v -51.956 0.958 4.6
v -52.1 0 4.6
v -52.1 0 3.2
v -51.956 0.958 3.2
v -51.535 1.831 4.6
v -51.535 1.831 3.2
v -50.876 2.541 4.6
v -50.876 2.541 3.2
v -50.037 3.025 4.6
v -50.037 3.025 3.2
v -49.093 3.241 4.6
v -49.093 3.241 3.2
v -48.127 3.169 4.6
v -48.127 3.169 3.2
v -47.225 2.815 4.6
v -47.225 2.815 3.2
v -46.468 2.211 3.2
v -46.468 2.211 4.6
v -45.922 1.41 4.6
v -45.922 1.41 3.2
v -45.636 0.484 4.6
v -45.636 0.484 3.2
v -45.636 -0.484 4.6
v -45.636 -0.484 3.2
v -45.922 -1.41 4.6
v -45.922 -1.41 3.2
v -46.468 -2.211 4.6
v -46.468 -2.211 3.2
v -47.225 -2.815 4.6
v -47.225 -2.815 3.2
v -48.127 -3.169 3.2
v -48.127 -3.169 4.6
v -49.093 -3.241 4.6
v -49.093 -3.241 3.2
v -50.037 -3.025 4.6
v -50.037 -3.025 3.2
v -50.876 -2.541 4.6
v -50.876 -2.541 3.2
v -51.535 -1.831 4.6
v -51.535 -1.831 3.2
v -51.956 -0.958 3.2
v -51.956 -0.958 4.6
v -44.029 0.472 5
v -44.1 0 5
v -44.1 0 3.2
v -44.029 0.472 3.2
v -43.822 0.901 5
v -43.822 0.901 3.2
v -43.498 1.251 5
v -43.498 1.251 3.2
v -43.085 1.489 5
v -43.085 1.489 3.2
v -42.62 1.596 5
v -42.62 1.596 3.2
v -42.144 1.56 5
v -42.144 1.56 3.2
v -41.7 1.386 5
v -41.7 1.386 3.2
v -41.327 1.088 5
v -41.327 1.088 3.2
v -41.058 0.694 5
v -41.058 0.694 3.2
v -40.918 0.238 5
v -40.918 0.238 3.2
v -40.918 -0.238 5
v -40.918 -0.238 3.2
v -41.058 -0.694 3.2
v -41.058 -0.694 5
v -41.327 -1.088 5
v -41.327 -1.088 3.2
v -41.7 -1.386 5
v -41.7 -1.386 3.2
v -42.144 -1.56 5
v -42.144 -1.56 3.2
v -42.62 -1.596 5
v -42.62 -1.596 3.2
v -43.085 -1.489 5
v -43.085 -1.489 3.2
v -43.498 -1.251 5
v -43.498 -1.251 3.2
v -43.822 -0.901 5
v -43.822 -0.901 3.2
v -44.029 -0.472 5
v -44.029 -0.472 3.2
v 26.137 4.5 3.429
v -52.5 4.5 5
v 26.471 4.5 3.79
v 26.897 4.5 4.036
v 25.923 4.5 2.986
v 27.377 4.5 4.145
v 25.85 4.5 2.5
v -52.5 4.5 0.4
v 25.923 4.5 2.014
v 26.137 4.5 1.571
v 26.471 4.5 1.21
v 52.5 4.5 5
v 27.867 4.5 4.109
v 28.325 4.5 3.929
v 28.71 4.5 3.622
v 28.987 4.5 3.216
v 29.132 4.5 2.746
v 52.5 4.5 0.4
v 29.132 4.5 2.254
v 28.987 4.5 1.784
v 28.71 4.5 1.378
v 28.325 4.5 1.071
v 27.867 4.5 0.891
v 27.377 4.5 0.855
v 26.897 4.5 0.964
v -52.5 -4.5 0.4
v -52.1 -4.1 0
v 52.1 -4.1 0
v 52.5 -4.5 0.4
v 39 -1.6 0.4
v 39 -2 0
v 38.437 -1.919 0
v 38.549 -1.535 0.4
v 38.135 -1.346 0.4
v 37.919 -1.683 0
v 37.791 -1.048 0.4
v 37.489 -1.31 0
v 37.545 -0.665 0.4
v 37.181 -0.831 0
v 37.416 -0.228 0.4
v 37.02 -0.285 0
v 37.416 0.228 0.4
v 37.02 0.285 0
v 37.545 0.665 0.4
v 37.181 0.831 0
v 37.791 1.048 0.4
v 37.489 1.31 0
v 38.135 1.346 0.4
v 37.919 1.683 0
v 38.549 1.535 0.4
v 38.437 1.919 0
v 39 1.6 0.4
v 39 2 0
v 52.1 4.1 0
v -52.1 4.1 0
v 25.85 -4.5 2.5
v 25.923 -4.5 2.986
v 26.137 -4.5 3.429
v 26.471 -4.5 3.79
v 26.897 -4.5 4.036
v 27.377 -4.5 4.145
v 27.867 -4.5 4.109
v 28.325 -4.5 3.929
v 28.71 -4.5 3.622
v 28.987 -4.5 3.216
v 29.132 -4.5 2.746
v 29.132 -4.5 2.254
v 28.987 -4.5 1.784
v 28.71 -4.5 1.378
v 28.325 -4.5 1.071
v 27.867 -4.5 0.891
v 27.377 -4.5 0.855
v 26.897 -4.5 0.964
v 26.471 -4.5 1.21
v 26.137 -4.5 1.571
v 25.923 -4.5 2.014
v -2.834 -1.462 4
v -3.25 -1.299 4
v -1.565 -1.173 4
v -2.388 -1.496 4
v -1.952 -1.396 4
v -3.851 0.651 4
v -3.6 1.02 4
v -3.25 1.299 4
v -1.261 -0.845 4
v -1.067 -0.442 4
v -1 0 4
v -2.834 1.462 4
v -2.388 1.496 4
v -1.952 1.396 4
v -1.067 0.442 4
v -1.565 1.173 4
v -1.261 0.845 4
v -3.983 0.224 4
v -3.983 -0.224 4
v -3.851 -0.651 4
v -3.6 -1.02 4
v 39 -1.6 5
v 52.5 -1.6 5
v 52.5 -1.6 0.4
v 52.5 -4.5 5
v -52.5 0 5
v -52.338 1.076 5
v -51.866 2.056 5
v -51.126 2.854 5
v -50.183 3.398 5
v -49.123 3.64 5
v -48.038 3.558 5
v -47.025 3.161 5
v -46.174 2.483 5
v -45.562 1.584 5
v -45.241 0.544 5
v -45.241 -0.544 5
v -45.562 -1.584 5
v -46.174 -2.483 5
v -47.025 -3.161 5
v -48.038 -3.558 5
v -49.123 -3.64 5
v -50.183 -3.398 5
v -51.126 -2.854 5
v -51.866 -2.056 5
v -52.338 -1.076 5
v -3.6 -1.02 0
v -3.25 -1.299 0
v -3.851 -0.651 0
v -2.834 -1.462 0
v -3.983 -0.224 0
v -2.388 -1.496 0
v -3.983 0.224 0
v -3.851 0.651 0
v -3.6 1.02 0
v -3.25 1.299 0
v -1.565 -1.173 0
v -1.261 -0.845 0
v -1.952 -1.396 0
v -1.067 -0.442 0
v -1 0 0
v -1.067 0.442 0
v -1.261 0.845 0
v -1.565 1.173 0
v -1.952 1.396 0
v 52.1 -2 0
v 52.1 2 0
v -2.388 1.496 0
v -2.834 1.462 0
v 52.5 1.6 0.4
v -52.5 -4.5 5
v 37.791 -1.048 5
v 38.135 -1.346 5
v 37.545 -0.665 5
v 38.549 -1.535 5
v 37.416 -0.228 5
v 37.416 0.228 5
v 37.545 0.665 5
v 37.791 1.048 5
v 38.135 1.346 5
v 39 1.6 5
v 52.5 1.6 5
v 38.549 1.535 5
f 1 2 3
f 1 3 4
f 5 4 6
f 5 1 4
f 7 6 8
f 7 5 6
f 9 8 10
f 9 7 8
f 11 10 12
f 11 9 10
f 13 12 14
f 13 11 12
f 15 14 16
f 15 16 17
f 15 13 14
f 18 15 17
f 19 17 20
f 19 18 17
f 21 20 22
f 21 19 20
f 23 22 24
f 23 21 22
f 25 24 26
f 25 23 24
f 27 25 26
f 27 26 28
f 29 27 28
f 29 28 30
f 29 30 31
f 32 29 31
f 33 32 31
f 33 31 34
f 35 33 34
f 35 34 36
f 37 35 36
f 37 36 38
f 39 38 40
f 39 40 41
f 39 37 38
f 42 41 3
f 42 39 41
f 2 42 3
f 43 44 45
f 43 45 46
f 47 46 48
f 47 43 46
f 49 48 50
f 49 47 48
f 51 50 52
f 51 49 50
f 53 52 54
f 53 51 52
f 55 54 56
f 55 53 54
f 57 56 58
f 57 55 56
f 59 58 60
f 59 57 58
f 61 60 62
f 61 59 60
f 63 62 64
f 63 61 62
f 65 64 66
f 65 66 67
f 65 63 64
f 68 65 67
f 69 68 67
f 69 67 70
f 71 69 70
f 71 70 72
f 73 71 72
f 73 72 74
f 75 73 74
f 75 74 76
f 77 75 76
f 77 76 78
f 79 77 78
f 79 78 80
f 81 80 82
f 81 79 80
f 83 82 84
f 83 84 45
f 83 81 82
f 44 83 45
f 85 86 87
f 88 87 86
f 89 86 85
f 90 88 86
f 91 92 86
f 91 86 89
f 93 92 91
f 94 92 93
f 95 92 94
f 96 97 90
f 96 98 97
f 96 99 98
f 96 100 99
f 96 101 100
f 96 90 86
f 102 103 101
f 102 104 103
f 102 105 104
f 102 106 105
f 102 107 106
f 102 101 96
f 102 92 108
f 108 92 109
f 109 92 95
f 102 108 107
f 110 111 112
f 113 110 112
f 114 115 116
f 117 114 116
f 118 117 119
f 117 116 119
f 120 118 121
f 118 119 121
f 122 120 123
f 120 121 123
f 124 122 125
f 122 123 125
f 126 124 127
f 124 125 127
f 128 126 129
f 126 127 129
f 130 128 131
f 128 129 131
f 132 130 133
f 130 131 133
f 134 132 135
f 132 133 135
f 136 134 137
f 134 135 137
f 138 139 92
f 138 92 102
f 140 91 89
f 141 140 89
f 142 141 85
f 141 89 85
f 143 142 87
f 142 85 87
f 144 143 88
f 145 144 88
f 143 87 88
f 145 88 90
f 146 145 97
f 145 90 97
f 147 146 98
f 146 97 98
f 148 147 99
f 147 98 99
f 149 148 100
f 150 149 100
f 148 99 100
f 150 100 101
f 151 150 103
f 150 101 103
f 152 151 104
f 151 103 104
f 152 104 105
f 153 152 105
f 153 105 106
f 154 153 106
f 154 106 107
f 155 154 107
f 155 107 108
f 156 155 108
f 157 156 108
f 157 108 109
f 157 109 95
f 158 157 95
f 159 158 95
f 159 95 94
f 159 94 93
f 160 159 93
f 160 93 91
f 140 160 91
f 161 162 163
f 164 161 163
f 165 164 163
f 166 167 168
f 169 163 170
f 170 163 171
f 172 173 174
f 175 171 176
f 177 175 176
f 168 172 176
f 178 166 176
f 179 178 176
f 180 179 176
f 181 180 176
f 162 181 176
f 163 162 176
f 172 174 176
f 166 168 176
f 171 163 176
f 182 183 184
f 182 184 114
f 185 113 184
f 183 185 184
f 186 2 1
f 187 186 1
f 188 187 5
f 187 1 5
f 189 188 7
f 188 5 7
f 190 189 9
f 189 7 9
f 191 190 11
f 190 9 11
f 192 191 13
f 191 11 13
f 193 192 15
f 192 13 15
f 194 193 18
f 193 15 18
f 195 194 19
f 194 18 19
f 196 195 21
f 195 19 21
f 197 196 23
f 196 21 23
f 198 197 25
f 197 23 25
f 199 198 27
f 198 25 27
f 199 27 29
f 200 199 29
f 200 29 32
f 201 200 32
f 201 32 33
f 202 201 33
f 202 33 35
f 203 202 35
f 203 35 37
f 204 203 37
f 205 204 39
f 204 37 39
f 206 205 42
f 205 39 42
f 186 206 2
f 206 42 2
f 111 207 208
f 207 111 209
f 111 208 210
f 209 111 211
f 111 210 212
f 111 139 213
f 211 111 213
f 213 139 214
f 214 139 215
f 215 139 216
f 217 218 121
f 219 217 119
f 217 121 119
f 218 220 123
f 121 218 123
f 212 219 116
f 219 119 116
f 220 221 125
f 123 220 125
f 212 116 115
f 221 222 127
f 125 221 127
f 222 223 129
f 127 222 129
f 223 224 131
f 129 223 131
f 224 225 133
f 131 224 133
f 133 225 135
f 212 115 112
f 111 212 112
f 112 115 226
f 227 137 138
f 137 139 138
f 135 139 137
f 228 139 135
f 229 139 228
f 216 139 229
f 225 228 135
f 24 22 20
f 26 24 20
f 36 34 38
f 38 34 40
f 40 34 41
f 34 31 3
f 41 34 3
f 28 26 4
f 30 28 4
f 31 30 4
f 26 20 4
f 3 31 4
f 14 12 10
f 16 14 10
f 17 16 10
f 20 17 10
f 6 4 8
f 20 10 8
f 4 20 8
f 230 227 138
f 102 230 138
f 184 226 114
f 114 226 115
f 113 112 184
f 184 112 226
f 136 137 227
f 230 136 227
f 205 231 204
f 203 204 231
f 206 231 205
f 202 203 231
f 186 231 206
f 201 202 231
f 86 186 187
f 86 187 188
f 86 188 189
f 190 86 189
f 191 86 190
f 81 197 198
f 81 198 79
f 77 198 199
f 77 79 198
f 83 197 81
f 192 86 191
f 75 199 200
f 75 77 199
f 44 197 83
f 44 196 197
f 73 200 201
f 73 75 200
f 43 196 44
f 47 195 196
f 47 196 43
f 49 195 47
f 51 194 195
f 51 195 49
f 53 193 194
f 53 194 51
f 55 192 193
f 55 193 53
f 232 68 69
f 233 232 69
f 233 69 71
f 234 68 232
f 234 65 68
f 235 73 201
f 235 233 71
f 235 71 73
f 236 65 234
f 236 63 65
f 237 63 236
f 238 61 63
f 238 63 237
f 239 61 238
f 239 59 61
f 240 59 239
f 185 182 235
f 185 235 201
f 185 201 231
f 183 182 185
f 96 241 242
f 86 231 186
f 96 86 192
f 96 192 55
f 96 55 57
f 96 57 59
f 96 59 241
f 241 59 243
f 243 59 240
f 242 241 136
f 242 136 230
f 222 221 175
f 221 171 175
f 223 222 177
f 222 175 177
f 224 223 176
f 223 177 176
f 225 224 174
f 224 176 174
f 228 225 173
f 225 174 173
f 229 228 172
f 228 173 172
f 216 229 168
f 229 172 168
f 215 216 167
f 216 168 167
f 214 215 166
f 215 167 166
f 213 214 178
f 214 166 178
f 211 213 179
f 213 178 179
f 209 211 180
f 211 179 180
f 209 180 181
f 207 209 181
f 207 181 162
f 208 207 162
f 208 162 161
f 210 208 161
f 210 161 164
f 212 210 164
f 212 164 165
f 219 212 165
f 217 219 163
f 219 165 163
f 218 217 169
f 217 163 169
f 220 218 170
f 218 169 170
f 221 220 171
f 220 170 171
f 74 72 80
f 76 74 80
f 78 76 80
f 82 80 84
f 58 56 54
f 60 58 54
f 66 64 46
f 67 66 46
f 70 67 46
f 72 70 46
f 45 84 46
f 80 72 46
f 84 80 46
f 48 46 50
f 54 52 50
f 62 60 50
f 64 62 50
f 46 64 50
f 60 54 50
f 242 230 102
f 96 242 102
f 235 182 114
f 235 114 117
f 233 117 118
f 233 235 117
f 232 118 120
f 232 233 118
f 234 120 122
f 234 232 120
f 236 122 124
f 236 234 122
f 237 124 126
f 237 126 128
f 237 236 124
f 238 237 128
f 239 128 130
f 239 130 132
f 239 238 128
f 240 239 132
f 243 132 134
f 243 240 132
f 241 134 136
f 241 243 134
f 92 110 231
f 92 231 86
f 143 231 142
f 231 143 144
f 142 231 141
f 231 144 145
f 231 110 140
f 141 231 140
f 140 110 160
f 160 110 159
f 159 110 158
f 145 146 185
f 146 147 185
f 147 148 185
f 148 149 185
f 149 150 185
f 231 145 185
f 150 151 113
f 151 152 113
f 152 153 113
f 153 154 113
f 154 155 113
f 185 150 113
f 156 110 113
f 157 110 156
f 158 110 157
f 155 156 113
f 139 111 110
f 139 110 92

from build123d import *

# Parameters (mm, degrees)
SKETCH1_W           = 105
SKETCH1_H           = 9
BOSS_EXTRUDE1_DEPTH = 5
CUT_EXTRUDE1_DEPTH  = 5
SKETCH8_W           = 8
SKETCH8_H           = 3.2
CUT_EXTRUDE4_DEPTH  = 10
SKETCH7_R           = 3.25
SKETCH7_R_2         = 1.6
CUT_EXTRUDE2_DEPTH  = 1.8
CHAMFER1_SIZE       = 0.4
CHAMFER2_SIZE       = 0.4
SKETCH2_R           = 1.65
CUT_EXTRUDE3_DEPTH  = 10
SKETCH10_R          = 1.5
CUT_EXTRUDE5_DEPTH  = 4


with BuildPart() as part:
    # Sketch1 → Boss-Extrude1 (new body)
    with BuildSketch(Plane.XY):
        Rectangle(SKETCH1_W, SKETCH1_H)
    extrude(amount=BOSS_EXTRUDE1_DEPTH)

    # Sketch4 → Cut-Extrude1 (cut)
    with BuildSketch(Plane.XY.offset(5)):
        with BuildLine():
            Line((39, 1.6), (45, 1.6))
            ThreePointArc((45, 1.6), (46.6, 0), (45, -1.6))
            Line((45, -1.6), (39, -1.6))
            ThreePointArc((39, -1.6), (37.4, 0), (39, 1.6))
        make_face()
    extrude(amount=-CUT_EXTRUDE1_DEPTH, mode=Mode.SUBTRACT)

    # Sketch8 → Cut-Extrude4 (cut)
    with BuildSketch(Plane.XY.offset(5)):
        with Locations((48.5, 0)):
            Rectangle(SKETCH8_W, SKETCH8_H)
    extrude(amount=-CUT_EXTRUDE4_DEPTH, mode=Mode.SUBTRACT)

    # Sketch7 → Cut-Extrude2 (cut)
    with BuildSketch(Plane(origin=(0, 0, 5), x_dir=(-1, 0, 0), z_dir=(0, 0, -1))):
        with Locations((48.85, 0)):
            Circle(SKETCH7_R)
        with Locations((42.5, 0)):
            Circle(SKETCH7_R_2)
    extrude(amount=CUT_EXTRUDE2_DEPTH, mode=Mode.SUBTRACT)

    # Chamfer1
    chamfer1_edges = [part.edges().sort_by_distance(p)[0] for p in [
        (-45.6, 0, 5),
    ]]
    chamfer(chamfer1_edges, length=CHAMFER1_SIZE - 0.0001)  # a hair under: the kernel refuses the full size

    # Chamfer2
    chamfer2_edges = [part.edges().sort_by_distance(p)[0] for p in [
        (37.4, 0, 0),
        (45.75, 1.6, 0),
        (45.75, -1.6, 0),
        (52.5, 3.05, 0),
        (0, 4.5, 0),
        (52.5, -3.05, 0),
        (0, -4.5, 0),
        (-52.5, 0, 0),
    ]]
    chamfer(chamfer2_edges, length=CHAMFER2_SIZE)

    # Sketch2 → Cut-Extrude3 (cut)
    with BuildSketch(Plane(origin=(0, 4.5, 0), x_dir=(1, 0, 0), z_dir=(0, 1, 0))):
        with Locations(Location((27.5, -2.5, 0), (0, 0, 180))):
            Circle(SKETCH2_R)
    extrude(amount=-CUT_EXTRUDE3_DEPTH, mode=Mode.SUBTRACT)

    # Sketch10 → Cut-Extrude5 (cut, symmetric)
    with BuildSketch(Plane.XY):
        with Locations((-2.5, 0)):
            Circle(SKETCH10_R)
    extrude(amount=CUT_EXTRUDE5_DEPTH, both=True, mode=Mode.SUBTRACT)


solid = part.part
